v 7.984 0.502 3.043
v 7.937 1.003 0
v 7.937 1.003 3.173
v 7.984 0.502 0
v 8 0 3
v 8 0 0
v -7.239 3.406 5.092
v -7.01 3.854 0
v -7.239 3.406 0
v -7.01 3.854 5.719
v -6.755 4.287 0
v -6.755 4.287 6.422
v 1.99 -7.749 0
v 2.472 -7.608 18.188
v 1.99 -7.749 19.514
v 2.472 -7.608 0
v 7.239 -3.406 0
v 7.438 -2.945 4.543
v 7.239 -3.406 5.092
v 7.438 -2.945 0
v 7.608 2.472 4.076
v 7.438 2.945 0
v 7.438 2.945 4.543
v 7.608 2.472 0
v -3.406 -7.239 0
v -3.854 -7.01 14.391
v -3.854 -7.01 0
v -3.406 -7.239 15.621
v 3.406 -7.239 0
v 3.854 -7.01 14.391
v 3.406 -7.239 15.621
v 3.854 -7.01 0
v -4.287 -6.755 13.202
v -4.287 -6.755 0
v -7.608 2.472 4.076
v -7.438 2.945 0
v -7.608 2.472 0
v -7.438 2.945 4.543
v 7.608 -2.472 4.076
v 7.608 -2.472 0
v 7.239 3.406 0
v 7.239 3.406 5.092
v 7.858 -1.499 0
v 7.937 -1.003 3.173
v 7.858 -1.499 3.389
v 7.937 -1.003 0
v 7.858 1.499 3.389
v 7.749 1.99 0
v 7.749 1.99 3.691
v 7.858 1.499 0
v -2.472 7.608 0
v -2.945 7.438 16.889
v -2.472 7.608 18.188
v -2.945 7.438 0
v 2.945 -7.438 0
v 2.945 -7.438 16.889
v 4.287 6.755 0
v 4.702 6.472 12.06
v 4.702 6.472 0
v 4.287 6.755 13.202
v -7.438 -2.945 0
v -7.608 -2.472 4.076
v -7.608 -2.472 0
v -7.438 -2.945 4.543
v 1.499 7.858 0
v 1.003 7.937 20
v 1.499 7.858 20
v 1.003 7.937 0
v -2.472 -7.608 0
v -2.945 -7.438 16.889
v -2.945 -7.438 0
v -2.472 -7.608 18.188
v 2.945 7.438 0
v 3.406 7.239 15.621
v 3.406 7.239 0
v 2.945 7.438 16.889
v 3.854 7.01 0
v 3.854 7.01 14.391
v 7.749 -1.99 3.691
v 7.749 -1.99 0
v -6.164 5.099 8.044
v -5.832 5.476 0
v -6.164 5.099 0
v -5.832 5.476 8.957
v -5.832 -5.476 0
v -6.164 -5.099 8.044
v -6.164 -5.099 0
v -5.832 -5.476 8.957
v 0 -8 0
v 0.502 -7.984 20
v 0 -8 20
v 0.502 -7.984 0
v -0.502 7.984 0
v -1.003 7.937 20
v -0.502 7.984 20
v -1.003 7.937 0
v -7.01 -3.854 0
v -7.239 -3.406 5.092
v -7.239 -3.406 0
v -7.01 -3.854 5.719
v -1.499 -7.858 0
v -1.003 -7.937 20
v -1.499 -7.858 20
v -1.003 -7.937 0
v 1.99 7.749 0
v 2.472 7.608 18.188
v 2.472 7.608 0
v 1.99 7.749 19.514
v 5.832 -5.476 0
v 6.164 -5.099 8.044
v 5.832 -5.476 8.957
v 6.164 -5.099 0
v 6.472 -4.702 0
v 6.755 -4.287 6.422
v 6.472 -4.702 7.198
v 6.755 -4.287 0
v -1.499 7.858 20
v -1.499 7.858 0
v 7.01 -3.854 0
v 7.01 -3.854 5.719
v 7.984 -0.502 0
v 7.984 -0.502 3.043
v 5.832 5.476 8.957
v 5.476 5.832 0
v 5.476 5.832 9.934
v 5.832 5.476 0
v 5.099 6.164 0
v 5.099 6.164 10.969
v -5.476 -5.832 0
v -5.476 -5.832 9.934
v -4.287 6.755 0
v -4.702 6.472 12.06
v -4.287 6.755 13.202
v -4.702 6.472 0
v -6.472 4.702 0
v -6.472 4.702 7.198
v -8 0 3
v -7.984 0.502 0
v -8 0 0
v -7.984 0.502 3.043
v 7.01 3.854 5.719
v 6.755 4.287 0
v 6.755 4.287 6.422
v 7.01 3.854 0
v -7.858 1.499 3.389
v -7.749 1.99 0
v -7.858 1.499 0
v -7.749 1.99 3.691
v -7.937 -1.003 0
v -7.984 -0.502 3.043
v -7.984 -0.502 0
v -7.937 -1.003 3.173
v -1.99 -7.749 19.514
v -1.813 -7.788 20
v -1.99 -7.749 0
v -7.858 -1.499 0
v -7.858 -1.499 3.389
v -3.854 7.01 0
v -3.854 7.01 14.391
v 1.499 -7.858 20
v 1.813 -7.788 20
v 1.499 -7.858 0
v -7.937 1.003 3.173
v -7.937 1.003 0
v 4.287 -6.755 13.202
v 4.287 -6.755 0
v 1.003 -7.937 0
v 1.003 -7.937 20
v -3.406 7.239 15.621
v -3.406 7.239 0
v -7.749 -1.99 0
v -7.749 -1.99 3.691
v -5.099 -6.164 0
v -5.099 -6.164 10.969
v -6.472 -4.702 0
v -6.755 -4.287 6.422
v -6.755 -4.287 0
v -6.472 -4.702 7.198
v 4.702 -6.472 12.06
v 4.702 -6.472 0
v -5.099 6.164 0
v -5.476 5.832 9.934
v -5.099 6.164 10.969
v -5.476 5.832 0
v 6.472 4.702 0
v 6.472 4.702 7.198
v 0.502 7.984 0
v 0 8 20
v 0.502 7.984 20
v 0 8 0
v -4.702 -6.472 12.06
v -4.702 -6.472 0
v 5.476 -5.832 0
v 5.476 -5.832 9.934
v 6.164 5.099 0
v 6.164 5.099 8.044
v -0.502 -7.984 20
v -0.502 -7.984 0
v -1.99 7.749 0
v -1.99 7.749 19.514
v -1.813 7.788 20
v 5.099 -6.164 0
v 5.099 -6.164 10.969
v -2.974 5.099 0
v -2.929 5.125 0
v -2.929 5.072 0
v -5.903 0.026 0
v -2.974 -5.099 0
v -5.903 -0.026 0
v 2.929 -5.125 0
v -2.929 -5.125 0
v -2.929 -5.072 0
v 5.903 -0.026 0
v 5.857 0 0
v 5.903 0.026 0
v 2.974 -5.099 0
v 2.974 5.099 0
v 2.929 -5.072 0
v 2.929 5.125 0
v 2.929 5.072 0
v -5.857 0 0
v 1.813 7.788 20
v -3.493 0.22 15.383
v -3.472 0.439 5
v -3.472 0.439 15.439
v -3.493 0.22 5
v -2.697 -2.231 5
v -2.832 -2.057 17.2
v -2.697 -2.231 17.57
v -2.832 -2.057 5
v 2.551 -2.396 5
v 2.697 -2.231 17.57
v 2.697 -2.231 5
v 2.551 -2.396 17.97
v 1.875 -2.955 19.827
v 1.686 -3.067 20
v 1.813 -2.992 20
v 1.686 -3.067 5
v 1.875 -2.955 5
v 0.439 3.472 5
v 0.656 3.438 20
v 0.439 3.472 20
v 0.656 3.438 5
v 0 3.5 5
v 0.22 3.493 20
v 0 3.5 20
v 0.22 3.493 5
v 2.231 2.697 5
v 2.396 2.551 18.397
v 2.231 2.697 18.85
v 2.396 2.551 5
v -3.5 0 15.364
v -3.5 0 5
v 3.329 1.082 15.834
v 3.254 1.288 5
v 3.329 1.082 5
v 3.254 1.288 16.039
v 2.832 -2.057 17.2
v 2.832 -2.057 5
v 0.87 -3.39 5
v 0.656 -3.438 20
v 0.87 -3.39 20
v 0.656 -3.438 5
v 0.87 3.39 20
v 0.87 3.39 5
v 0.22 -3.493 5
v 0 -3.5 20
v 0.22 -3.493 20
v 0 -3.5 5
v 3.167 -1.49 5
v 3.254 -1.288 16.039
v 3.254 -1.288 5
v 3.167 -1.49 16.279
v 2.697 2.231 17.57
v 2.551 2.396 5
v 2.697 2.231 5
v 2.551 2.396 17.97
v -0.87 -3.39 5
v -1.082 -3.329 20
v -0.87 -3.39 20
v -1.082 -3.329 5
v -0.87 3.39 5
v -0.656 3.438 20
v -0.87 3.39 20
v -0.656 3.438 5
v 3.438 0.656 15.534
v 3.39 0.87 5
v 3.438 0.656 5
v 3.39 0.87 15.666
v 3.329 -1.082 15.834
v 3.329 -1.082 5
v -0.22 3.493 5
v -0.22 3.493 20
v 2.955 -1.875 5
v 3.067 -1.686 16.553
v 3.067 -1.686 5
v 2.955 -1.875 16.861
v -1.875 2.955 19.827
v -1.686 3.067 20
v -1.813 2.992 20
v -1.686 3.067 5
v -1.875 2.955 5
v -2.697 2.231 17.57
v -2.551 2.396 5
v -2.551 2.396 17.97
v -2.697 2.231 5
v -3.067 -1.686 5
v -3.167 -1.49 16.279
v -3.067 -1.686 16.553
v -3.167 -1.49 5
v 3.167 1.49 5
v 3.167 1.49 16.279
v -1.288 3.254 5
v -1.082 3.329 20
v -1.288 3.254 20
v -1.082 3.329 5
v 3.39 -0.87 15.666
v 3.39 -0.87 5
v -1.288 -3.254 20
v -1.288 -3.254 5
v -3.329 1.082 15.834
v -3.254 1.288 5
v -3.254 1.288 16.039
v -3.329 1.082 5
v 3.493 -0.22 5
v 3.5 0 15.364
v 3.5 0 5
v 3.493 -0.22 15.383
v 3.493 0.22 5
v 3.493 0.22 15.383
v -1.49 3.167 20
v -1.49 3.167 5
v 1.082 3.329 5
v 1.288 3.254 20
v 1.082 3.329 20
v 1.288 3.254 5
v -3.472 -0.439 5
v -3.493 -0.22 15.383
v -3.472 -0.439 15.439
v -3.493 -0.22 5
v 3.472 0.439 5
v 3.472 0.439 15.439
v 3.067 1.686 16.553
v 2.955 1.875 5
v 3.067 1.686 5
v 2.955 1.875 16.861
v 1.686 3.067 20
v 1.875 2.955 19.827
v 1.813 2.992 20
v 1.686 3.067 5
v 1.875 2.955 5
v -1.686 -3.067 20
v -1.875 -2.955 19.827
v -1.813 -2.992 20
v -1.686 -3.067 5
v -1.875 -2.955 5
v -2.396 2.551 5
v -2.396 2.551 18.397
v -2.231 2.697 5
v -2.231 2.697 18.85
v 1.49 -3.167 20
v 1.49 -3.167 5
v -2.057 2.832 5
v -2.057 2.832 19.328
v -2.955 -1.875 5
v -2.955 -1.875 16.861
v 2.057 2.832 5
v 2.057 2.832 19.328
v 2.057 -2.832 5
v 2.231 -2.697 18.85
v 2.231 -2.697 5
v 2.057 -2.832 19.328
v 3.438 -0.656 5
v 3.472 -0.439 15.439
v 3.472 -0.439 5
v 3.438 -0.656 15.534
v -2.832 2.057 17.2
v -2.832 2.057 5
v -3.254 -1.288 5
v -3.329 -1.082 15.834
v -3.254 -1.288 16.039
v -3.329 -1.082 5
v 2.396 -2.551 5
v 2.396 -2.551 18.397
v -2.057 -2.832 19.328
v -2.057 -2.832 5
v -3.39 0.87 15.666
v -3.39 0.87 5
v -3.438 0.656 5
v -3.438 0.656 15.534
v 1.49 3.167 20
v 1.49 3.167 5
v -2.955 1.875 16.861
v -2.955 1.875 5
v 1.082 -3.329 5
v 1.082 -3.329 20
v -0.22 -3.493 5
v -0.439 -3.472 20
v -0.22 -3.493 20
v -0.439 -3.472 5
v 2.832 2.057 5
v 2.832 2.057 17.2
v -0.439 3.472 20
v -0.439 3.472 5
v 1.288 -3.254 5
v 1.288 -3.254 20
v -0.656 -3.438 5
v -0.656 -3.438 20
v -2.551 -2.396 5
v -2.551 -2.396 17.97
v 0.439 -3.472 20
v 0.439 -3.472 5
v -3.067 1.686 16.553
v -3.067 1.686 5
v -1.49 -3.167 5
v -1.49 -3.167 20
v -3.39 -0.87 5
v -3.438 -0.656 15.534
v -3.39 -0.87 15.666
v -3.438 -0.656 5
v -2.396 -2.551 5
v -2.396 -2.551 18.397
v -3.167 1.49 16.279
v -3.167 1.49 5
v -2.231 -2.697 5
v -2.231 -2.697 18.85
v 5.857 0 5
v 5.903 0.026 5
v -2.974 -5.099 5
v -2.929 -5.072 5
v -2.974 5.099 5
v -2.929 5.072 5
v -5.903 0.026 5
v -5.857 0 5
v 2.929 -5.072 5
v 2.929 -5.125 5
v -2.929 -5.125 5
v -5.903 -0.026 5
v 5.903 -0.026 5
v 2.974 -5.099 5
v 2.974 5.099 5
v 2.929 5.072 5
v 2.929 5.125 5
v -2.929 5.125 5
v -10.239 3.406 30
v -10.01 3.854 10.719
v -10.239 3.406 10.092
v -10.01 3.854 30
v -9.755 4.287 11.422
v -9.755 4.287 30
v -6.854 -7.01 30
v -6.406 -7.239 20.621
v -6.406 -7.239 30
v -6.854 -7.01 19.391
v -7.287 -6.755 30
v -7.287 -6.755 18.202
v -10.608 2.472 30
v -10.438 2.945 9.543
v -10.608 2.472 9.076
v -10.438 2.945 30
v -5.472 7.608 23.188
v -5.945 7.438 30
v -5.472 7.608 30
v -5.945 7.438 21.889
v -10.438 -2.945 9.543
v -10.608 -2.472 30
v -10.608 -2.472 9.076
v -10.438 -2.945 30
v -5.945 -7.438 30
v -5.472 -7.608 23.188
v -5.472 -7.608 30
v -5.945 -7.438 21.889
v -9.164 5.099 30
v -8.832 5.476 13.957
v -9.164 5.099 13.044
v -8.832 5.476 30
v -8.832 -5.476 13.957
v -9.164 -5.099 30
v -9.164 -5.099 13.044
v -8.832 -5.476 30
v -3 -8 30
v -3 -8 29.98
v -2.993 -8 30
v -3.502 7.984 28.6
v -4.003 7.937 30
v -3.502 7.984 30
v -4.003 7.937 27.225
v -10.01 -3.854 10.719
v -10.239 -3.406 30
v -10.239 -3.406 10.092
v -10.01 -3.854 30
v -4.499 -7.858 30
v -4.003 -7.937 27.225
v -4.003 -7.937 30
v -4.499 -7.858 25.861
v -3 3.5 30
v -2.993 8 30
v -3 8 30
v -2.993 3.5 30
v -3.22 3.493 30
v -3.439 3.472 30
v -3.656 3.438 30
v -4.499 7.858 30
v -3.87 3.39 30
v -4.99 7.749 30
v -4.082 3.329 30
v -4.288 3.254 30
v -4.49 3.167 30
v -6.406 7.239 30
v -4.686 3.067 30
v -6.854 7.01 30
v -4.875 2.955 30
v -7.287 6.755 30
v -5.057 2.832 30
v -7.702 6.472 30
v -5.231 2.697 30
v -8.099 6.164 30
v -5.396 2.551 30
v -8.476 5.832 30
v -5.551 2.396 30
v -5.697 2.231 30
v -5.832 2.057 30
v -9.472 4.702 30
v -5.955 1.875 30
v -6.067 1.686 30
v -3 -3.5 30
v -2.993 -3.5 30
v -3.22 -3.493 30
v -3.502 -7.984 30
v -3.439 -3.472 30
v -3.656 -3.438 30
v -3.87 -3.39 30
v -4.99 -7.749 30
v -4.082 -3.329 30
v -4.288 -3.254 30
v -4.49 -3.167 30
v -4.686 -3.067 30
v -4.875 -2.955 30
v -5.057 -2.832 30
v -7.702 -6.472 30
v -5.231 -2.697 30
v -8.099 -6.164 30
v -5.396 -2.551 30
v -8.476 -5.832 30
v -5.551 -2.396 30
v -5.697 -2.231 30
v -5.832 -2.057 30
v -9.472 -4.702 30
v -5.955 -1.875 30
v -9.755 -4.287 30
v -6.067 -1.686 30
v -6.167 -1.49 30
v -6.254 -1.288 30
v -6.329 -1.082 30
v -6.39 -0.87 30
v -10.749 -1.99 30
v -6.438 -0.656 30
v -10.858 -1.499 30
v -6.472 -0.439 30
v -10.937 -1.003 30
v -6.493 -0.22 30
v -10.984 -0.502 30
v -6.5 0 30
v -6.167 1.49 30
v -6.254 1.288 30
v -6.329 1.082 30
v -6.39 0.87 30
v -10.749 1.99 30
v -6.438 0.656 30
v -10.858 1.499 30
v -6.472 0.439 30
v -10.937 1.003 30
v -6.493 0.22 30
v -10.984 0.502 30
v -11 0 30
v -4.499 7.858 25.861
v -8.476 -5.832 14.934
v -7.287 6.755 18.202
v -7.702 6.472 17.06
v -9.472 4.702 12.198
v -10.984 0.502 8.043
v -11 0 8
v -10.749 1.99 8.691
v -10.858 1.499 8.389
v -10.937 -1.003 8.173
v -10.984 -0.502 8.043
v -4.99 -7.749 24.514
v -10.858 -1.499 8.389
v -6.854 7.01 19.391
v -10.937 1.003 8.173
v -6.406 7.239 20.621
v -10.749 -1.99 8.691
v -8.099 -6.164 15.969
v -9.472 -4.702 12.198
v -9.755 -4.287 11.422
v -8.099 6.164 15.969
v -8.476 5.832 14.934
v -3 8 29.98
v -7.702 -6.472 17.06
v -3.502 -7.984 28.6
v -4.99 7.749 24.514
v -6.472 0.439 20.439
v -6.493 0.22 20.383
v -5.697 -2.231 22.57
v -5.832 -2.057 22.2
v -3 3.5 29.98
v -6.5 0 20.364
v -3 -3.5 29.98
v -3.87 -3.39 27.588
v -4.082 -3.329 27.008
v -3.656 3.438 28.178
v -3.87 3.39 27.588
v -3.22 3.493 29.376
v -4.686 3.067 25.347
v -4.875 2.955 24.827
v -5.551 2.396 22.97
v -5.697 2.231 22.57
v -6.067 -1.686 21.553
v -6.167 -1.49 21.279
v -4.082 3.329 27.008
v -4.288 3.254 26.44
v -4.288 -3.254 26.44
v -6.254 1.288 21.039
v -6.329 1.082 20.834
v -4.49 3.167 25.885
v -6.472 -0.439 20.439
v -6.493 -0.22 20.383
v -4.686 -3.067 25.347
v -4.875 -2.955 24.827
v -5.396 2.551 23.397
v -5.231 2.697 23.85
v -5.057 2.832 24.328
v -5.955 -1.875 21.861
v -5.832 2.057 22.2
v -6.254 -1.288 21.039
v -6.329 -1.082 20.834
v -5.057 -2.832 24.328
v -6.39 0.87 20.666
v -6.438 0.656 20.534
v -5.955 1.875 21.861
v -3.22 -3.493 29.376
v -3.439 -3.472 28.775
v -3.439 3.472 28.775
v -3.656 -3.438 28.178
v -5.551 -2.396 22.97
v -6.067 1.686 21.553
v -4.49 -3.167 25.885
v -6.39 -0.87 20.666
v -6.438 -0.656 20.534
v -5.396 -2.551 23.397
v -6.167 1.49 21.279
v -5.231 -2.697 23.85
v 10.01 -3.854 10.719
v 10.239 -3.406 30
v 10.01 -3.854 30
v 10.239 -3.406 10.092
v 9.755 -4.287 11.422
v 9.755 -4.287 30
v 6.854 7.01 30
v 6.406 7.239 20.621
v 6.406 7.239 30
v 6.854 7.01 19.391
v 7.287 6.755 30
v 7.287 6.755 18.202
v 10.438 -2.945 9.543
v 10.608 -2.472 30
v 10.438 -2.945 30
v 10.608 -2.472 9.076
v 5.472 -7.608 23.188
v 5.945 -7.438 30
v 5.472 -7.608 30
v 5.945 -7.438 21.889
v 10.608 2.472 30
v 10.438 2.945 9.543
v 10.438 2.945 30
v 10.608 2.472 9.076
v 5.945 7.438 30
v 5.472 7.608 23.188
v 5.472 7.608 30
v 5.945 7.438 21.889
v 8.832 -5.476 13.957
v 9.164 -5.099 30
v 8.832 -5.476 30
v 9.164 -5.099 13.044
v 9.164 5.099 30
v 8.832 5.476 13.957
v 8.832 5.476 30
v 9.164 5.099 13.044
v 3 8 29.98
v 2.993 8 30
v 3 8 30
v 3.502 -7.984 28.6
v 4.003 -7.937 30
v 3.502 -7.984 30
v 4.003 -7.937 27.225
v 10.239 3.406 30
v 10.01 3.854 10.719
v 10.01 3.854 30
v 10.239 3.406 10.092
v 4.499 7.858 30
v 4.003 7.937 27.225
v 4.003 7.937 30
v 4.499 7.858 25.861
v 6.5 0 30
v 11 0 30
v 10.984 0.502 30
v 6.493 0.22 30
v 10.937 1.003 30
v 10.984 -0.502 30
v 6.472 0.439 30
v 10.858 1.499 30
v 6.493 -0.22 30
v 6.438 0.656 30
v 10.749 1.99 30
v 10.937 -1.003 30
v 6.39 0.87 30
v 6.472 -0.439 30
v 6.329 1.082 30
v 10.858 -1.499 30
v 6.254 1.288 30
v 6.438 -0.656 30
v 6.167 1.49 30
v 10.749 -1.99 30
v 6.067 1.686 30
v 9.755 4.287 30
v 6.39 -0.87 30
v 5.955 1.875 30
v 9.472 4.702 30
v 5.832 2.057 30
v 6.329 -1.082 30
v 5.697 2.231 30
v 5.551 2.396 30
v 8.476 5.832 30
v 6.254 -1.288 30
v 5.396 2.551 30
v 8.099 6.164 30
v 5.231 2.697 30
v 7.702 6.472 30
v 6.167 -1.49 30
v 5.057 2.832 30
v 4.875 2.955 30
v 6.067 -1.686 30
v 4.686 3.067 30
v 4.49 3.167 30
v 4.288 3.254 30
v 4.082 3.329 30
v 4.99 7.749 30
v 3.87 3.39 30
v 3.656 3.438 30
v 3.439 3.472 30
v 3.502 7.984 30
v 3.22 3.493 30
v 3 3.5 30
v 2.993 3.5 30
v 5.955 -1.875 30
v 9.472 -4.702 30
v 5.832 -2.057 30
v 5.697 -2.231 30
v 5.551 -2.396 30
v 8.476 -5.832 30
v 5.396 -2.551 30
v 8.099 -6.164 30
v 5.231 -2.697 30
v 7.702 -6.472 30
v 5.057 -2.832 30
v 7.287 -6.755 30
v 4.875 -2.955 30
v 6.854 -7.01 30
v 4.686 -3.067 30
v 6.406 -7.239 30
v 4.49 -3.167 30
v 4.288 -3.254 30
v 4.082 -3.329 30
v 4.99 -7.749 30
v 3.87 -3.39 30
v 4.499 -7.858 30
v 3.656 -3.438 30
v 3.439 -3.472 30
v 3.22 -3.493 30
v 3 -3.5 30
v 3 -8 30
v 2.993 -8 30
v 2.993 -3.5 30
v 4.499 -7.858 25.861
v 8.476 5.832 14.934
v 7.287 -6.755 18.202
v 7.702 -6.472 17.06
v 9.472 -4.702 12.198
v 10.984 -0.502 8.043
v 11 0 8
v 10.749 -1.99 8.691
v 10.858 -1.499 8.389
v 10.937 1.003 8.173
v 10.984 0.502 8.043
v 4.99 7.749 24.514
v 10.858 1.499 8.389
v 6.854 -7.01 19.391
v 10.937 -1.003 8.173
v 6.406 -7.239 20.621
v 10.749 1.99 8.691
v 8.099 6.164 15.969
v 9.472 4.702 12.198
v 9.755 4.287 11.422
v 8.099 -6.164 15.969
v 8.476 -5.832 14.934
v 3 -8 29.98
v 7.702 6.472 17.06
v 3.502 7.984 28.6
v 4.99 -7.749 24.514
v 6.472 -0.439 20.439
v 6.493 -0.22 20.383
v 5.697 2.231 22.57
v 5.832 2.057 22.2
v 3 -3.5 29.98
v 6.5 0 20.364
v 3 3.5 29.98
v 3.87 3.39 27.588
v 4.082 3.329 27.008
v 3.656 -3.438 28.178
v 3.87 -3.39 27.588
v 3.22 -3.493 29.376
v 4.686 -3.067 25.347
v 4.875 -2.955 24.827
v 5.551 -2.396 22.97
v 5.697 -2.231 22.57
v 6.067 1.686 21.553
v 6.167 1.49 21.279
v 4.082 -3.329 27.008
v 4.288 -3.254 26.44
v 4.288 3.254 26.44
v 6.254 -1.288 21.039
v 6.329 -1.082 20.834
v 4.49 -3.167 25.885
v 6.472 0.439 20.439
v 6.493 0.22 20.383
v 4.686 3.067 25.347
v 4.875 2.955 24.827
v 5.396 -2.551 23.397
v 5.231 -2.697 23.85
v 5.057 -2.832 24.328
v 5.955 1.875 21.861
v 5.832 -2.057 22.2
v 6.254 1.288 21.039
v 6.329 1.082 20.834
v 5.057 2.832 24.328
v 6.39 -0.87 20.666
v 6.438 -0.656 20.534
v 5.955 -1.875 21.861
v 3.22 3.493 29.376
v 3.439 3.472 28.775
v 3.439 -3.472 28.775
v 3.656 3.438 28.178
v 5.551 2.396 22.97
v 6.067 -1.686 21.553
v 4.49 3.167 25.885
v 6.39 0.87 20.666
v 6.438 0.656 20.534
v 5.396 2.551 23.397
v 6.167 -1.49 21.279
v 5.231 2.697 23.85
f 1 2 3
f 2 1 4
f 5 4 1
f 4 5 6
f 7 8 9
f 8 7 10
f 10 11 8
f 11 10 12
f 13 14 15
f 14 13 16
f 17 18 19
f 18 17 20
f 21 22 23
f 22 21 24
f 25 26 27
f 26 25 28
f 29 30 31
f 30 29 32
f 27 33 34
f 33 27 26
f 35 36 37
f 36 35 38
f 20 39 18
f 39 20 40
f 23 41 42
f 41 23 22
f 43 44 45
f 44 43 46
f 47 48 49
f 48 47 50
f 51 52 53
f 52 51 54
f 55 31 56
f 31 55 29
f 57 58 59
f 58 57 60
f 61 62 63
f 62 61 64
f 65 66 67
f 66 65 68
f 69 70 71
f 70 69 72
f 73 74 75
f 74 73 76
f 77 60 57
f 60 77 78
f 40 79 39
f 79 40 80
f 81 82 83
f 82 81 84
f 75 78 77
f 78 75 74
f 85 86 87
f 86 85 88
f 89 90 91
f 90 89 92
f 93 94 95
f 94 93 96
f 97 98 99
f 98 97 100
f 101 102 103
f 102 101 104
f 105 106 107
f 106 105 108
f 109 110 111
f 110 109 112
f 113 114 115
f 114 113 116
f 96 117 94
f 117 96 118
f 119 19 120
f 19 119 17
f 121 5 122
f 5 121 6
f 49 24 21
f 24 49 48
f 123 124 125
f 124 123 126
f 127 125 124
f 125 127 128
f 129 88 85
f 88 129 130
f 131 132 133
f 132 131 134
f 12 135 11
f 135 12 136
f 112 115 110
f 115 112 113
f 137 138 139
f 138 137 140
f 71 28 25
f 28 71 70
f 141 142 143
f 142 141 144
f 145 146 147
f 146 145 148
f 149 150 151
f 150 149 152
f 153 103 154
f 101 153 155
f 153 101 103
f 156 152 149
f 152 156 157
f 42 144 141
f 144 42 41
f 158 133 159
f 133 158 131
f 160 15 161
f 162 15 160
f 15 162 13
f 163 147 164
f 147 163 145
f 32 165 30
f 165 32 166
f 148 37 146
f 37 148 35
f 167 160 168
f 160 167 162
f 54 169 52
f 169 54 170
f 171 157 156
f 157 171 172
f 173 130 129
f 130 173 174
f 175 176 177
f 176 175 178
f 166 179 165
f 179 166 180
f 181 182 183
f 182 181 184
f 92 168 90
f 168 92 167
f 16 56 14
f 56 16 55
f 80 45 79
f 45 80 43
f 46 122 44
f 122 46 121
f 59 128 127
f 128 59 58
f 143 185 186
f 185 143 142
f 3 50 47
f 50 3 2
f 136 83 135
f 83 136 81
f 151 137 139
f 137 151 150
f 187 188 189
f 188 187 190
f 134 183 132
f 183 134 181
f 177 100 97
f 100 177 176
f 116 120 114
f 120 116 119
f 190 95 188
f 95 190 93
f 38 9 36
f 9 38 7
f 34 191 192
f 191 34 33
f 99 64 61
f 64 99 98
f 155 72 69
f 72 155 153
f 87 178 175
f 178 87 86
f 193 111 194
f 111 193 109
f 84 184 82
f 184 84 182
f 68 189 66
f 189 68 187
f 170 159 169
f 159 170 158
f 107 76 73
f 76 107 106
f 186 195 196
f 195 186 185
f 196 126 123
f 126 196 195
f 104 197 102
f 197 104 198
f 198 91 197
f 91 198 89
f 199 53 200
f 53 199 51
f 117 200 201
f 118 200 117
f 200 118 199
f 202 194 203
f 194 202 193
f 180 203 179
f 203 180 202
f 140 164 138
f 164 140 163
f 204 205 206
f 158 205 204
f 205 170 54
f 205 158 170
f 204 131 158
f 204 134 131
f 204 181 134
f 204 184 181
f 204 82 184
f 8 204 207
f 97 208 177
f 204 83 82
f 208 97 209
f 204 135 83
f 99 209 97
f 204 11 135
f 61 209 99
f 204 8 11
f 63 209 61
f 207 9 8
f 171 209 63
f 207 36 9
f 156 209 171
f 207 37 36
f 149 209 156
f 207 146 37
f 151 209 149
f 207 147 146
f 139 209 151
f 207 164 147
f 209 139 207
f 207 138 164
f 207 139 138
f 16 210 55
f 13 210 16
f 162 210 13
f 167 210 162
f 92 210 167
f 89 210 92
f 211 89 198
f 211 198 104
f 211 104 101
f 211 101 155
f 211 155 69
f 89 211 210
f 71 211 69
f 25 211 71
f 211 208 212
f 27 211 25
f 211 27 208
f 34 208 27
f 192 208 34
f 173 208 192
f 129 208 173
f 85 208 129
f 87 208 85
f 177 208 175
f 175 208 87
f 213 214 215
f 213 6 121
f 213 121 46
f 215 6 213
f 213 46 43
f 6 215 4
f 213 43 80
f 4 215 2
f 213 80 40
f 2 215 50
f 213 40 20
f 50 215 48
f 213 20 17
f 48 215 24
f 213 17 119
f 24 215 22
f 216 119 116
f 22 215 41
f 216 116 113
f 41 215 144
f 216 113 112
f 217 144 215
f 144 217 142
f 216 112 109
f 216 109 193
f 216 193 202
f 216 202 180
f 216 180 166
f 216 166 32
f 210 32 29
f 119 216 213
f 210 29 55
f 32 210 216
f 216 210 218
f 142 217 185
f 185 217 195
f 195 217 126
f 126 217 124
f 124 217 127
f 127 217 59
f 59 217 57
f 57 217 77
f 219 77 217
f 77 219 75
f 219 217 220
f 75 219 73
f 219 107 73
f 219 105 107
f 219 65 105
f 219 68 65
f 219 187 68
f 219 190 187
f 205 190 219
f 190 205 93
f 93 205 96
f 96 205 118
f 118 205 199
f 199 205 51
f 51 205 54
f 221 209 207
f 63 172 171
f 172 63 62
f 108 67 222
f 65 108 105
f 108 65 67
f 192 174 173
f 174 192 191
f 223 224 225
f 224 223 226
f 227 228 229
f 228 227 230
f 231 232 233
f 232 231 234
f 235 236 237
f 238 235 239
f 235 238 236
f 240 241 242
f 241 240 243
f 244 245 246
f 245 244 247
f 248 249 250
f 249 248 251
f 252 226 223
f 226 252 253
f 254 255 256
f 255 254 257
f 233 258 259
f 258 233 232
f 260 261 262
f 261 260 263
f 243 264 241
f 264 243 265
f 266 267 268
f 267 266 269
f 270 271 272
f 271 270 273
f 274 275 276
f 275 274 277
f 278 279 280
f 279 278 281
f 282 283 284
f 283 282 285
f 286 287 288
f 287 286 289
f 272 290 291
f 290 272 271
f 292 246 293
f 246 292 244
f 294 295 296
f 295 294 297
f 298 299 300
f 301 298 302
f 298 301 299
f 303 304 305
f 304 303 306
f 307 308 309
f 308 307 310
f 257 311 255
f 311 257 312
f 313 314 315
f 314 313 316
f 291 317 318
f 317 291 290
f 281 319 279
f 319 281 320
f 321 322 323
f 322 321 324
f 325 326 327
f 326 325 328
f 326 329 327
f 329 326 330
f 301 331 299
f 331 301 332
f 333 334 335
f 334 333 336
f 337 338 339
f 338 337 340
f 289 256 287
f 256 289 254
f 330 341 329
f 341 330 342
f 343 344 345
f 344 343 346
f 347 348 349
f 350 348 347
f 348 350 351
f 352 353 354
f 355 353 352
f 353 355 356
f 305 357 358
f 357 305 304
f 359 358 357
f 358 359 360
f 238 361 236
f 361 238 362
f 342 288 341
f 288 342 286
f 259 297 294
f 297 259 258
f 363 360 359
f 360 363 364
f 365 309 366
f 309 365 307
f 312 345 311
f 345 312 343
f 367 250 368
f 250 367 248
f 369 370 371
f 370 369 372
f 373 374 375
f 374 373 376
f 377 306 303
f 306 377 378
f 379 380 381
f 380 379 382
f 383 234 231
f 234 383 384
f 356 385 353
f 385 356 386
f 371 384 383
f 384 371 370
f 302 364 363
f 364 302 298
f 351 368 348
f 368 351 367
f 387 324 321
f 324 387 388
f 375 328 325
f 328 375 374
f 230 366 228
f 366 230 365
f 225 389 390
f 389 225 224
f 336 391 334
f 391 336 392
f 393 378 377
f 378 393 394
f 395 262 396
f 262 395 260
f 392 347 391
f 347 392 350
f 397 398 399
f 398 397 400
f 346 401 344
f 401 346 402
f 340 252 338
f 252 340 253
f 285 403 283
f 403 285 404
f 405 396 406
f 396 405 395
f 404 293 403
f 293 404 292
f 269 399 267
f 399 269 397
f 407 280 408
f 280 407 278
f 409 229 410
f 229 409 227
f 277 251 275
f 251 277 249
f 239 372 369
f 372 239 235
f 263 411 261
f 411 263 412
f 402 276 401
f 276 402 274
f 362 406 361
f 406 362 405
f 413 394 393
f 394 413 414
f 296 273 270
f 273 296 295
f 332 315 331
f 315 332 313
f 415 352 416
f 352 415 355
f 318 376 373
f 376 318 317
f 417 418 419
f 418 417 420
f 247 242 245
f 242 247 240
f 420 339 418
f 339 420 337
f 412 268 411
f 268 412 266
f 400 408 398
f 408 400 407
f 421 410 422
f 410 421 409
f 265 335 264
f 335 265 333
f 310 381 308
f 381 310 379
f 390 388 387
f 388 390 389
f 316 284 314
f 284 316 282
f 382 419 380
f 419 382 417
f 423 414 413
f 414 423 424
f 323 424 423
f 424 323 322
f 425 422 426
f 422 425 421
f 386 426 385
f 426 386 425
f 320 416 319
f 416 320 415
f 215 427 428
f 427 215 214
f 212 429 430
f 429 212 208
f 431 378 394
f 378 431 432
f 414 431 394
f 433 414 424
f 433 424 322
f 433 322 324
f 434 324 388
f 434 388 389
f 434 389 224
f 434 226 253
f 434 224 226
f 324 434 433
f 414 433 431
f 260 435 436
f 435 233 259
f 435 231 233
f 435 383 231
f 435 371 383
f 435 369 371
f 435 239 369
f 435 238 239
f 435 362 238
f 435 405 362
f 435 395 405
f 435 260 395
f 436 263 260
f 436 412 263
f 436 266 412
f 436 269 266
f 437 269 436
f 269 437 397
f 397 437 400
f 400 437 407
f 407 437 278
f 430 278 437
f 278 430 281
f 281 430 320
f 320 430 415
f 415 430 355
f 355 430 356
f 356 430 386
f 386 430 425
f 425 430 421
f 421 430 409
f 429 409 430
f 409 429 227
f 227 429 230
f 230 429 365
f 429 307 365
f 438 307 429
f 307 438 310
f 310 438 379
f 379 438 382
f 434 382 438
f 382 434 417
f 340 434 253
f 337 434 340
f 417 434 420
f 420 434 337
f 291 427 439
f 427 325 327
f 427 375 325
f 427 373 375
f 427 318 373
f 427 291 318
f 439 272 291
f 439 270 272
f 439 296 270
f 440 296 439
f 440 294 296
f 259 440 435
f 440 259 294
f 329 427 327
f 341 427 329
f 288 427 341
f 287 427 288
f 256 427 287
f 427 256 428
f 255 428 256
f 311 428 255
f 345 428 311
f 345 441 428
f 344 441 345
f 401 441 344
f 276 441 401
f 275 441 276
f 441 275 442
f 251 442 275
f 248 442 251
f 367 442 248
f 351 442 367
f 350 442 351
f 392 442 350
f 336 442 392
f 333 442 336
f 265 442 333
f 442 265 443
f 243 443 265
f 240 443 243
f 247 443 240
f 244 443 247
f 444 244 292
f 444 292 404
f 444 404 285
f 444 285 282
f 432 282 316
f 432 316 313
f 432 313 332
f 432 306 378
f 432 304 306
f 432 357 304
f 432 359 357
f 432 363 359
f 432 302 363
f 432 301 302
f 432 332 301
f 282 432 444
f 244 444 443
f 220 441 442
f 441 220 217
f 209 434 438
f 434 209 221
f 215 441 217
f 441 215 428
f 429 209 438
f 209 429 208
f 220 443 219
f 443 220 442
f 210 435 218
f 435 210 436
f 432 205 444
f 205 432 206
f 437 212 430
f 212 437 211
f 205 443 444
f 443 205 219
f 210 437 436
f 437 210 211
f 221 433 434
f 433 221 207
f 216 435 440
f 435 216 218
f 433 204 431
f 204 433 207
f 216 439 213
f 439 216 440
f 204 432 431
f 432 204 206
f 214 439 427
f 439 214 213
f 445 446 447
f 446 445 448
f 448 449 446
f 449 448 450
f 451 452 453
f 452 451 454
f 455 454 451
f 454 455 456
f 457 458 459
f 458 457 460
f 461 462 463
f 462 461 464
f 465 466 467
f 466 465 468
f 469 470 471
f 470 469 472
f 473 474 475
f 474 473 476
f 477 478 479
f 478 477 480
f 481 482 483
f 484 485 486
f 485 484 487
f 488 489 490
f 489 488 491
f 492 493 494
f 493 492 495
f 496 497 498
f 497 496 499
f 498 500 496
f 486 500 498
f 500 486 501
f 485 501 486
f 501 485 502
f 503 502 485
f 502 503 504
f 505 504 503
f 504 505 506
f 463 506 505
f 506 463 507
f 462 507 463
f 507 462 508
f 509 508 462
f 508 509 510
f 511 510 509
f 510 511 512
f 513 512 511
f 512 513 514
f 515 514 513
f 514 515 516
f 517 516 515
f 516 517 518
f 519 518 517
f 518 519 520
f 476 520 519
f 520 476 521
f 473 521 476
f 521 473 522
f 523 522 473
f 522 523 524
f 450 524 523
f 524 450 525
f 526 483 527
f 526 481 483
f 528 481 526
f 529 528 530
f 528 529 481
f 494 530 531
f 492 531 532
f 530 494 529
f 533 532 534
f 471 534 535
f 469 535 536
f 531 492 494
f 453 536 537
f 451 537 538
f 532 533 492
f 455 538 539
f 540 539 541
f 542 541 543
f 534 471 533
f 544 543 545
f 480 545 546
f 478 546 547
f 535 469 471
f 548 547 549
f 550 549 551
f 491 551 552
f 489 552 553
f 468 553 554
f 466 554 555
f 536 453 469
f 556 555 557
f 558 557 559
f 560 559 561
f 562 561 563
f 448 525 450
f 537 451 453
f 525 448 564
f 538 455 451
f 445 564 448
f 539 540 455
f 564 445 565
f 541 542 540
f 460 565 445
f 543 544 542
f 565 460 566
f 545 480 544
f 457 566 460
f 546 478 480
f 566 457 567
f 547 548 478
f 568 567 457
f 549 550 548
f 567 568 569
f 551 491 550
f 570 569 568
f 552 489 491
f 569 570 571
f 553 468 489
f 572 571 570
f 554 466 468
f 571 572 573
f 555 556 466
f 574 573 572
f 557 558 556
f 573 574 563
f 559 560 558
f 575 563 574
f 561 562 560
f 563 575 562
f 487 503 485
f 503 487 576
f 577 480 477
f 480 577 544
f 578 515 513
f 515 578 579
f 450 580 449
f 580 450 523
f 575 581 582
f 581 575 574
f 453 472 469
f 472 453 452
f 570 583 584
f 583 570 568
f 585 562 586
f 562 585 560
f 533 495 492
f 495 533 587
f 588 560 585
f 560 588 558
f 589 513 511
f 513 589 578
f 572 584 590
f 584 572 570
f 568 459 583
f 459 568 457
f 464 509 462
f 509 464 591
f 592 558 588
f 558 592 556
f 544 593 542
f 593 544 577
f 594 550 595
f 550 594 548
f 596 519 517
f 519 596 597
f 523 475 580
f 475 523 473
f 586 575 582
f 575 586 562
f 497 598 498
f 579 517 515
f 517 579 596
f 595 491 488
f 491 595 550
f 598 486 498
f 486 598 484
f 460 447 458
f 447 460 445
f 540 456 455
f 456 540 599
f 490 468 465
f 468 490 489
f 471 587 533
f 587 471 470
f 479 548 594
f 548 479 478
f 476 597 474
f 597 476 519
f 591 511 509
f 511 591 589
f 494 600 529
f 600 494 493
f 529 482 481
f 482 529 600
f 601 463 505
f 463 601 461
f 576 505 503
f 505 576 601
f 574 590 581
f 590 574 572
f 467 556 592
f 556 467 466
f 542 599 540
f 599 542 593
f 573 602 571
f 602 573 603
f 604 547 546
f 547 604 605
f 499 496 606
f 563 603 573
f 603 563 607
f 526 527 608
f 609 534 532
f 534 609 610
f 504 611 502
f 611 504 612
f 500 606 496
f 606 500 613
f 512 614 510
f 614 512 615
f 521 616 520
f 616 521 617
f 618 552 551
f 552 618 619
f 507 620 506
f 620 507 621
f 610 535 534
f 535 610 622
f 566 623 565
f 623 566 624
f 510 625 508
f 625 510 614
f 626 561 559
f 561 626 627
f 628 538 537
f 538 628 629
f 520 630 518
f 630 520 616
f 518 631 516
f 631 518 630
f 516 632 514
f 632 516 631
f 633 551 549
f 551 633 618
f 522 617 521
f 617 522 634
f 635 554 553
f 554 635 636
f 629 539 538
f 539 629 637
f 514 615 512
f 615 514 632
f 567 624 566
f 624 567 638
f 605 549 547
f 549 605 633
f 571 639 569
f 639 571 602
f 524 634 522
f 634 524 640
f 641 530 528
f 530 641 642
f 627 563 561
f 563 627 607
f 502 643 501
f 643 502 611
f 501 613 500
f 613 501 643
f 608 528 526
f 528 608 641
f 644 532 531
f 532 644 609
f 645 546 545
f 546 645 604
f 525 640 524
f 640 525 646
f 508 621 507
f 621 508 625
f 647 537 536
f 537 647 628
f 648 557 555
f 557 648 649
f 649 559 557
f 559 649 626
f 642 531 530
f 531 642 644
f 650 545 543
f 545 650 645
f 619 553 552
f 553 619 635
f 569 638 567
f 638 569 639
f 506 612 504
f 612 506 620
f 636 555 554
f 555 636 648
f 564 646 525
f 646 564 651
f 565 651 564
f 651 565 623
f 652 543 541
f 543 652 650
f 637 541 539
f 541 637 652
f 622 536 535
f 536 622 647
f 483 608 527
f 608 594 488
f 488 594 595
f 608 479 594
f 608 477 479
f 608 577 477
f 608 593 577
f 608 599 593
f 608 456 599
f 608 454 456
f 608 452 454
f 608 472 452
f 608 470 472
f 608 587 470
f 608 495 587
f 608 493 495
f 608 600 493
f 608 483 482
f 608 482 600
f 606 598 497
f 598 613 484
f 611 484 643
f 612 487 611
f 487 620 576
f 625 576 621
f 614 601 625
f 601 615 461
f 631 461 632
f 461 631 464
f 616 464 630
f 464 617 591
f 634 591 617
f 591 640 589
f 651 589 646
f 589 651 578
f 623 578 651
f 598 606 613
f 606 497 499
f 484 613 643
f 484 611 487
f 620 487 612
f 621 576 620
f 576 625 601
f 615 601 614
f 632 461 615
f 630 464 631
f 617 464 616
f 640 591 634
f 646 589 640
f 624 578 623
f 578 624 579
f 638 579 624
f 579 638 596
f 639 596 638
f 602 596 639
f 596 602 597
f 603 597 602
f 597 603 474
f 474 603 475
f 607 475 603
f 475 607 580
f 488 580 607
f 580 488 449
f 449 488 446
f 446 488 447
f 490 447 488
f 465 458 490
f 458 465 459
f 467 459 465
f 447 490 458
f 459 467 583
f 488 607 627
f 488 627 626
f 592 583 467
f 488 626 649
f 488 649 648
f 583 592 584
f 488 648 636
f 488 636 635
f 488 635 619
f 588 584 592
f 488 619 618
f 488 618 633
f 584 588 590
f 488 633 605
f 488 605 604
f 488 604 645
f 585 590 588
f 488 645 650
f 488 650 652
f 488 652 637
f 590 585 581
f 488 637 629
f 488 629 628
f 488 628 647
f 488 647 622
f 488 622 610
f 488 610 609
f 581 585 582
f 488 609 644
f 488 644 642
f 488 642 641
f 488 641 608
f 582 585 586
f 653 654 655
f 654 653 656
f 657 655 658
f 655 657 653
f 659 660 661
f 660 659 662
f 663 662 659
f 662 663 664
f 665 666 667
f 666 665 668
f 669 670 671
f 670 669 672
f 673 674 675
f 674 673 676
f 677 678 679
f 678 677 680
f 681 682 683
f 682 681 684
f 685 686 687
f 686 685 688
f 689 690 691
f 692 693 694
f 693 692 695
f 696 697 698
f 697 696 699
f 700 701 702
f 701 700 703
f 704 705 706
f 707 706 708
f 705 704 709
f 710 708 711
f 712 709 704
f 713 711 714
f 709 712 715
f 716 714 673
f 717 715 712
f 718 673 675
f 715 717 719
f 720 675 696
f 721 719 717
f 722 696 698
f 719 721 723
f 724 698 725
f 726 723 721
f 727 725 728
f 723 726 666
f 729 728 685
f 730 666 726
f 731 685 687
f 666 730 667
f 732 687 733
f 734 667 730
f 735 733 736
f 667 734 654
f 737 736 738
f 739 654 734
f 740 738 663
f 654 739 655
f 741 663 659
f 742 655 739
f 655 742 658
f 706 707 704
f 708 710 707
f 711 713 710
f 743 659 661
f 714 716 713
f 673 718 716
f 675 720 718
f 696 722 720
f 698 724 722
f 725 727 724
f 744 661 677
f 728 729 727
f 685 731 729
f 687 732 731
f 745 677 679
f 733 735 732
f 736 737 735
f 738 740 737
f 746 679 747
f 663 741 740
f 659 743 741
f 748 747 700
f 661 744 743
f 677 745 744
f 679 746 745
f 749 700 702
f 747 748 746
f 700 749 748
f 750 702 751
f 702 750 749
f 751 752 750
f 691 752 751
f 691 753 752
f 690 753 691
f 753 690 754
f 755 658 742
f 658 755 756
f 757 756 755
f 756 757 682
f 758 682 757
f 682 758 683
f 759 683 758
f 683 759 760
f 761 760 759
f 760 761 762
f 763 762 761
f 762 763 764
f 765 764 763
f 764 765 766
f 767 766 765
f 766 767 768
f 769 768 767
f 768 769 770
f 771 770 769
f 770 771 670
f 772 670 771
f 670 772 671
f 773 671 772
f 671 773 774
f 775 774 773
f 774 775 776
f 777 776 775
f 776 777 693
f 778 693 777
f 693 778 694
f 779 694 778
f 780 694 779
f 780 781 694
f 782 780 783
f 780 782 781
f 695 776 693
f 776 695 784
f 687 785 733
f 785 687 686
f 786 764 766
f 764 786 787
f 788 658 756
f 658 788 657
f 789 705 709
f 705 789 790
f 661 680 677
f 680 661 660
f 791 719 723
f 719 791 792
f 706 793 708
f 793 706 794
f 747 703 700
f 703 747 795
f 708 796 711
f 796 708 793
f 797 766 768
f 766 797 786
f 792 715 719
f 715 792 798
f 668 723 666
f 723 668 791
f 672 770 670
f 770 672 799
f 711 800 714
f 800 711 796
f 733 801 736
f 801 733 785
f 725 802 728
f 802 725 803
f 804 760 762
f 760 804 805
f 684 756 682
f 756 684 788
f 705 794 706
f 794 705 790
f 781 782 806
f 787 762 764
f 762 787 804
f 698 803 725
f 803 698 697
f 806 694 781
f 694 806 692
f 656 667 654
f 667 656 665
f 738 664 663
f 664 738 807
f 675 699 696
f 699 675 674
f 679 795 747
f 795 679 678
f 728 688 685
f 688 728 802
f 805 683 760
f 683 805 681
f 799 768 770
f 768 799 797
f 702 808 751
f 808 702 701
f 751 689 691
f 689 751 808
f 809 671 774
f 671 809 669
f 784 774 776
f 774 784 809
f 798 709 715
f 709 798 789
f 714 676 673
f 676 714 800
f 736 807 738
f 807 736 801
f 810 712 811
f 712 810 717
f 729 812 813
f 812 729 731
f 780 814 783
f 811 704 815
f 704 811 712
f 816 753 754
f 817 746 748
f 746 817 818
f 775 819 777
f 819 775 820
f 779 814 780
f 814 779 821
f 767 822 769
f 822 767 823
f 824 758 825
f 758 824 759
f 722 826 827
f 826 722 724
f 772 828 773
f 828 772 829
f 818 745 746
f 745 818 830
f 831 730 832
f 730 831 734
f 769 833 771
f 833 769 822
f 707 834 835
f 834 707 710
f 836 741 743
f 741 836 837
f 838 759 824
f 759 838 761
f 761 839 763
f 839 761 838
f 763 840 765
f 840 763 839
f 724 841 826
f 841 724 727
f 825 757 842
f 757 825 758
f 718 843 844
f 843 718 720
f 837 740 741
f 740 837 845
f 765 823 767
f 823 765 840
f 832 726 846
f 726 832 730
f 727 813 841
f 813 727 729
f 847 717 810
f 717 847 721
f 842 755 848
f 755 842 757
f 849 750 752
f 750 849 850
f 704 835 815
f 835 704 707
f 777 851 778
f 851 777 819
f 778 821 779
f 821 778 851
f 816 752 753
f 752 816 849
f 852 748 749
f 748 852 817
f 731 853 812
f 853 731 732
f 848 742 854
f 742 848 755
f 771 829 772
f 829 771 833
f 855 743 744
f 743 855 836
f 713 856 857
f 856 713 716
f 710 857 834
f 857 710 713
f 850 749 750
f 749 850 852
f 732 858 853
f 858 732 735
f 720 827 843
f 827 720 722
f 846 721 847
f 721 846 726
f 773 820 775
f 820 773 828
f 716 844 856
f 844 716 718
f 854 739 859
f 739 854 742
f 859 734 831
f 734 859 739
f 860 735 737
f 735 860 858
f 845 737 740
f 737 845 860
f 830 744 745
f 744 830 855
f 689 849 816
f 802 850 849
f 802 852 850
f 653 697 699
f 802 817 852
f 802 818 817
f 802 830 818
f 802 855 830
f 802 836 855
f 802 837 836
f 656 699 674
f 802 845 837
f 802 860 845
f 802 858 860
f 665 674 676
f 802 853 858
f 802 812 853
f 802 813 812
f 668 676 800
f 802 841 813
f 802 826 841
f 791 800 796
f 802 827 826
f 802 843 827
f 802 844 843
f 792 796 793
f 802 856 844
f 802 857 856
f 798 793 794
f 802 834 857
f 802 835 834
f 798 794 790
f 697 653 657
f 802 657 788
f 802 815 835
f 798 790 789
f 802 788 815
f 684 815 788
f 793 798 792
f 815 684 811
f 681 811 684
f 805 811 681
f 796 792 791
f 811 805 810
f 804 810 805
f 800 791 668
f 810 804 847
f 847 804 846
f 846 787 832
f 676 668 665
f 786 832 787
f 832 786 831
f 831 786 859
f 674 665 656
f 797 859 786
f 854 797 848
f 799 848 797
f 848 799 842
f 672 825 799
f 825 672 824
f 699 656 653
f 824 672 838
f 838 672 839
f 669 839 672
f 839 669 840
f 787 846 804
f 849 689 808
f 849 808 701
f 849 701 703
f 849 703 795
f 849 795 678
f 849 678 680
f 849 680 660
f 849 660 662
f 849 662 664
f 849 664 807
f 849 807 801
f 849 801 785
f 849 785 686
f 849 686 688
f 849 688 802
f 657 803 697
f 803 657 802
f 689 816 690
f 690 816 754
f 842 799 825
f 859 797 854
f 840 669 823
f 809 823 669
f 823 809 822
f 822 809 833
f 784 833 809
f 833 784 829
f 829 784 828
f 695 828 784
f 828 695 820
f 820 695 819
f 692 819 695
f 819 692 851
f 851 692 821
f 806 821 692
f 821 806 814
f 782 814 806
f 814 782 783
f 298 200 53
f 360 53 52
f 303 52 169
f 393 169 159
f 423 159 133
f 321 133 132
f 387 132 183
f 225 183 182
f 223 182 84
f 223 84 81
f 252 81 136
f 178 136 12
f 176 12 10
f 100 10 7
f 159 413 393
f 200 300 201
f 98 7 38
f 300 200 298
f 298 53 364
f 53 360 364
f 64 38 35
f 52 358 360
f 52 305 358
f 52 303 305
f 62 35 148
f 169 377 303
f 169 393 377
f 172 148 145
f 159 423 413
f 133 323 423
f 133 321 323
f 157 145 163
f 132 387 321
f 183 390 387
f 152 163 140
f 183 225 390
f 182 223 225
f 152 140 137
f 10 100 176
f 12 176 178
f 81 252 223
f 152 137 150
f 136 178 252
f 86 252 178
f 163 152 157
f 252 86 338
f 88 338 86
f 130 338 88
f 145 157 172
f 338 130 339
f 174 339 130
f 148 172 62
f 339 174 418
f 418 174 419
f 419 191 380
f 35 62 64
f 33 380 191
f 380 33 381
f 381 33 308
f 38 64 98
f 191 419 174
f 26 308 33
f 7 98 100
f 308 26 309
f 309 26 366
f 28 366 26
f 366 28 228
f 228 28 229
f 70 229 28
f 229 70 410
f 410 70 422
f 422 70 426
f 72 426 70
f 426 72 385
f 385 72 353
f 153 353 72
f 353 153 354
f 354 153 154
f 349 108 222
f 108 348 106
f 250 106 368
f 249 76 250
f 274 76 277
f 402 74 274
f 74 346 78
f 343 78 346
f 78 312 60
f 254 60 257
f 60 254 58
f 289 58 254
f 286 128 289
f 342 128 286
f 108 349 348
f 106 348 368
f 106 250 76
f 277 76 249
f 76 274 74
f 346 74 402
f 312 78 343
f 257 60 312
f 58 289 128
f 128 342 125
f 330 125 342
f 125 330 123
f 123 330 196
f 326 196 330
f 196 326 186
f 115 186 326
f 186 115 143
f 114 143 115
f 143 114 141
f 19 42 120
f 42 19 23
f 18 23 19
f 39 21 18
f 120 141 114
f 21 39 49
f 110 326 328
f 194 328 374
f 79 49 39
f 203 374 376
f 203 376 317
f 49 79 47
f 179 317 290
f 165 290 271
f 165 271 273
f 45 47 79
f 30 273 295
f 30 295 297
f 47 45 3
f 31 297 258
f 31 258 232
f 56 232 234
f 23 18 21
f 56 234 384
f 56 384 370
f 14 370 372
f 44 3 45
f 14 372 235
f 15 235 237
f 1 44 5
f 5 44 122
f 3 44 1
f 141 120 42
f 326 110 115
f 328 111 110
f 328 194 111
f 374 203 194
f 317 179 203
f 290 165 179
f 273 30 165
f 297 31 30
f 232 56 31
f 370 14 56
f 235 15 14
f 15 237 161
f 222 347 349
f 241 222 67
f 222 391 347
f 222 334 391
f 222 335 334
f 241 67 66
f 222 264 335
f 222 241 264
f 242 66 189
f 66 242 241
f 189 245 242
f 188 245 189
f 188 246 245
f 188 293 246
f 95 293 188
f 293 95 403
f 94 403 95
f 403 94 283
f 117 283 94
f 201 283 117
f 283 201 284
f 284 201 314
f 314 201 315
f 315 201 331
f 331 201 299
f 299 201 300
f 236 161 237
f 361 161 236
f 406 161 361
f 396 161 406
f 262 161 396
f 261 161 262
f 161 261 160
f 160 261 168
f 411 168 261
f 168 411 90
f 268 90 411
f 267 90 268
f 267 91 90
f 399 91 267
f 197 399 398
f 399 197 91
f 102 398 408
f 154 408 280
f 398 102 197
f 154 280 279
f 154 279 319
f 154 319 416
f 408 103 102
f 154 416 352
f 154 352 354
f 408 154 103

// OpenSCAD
height = 25.0;
width = 16.0;
hole_width = 7;
expand_part_shift = 3;
expand_gap = 5;
nut_width = 10.25;
nut_height = 5;

$fn = 100;

module tube(height, radius, wall, center = false) {
  difference() {
    cylinder(h=height, r=radius, center=center);
    cylinder(h=height, r=radius-wall, center=center);
  }
}

module hexagon(size, height) {
	boxWidth = size/1.75;
	for (r = [-60, 0, 60]) rotate([0,0,r]) cube([boxWidth, size, height], true);
}

module base(height, width, hole_width, nut_width, nut_height) {
	difference() {
		tube(height, width / 2, (width - hole_width) / 2);
		translate([0, 0, nut_height / 2]) hexagon(nut_width, nut_height);
	}
}

module expanding_part() {
	difference() {
		base(height, width, hole_width, nut_width, nut_height);
		cut_block();
	}
}

module cut_block() {
	translate([-1 * width / 2, -1 * width / 2, expand_part_shift])
		rotate([0, 20, 0])
			translate([0, 0, -1 * height])
				cube([width*2, width, 100]);
}

module push_part() {
	difference() {
		intersection() {
			base(height, width, hole_width, nut_width, nut_height);
			cut_block();
			rotate([0, 0, 180]) cut_block();
		}

		translate([0, 0, height - expand_gap + 10]) cube([20, 20, 20], true);
	}
}

translate([-3, 0, 5]) expanding_part();
translate([3, 0, 5]) rotate([0, 0, 180]) expanding_part();
push_part();

// For demostration only:
%color("PowderBlue") {
	// Nut
	translate([0, 0, -10]) 
		difference() {
			hexagon(nut_width, nut_height);
			cylinder(h = 100, r = hole_width / 2, center = true);
		}
	
	// Bolt
	translate([0, 0, 60])
		cylinder(h = 40, r = hole_width / 2, center = true);
	translate([0, 0, 80])
		hexagon(nut_width, nut_height / 1.5);
	
	// Washer
	translate([0, 0, 35])
		tube(1, width / 2, (width - hole_width) / 2);
}
